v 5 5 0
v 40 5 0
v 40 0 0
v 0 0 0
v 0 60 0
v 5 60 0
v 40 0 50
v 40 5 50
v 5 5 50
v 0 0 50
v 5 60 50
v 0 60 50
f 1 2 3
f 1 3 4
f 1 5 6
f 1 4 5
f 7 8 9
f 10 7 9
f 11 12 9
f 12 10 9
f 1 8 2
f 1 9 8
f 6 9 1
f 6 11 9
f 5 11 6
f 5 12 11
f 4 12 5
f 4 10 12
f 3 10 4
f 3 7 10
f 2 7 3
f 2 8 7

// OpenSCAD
$fn = 32;

// ----------------------------------------------------------------------
// Structural section: angle 40 x 60 mm
// ----------------------------------------------------------------------

// --- parameters (mm) ---
sec_w = 40;               // leg width, X
sec_h = 60;               // leg height, Y
flange_t = 5;             // leg thickness
plate_t = 50;             // cut length, Z (extrusion height)
fit_tol = 0.1;            // declared fit tolerance (prompt contract)
free_tol = 0.3;           // declared free tolerance (prompt contract)

profile = [[0, 0], [40, 0], [40, 5], [5, 5], [5, 60], [0, 60]];  // primary outline, 6 points, counter clockwise

// --- the one profile operation ---
linear_extrude(height = plate_t) polygon(points = profile);
